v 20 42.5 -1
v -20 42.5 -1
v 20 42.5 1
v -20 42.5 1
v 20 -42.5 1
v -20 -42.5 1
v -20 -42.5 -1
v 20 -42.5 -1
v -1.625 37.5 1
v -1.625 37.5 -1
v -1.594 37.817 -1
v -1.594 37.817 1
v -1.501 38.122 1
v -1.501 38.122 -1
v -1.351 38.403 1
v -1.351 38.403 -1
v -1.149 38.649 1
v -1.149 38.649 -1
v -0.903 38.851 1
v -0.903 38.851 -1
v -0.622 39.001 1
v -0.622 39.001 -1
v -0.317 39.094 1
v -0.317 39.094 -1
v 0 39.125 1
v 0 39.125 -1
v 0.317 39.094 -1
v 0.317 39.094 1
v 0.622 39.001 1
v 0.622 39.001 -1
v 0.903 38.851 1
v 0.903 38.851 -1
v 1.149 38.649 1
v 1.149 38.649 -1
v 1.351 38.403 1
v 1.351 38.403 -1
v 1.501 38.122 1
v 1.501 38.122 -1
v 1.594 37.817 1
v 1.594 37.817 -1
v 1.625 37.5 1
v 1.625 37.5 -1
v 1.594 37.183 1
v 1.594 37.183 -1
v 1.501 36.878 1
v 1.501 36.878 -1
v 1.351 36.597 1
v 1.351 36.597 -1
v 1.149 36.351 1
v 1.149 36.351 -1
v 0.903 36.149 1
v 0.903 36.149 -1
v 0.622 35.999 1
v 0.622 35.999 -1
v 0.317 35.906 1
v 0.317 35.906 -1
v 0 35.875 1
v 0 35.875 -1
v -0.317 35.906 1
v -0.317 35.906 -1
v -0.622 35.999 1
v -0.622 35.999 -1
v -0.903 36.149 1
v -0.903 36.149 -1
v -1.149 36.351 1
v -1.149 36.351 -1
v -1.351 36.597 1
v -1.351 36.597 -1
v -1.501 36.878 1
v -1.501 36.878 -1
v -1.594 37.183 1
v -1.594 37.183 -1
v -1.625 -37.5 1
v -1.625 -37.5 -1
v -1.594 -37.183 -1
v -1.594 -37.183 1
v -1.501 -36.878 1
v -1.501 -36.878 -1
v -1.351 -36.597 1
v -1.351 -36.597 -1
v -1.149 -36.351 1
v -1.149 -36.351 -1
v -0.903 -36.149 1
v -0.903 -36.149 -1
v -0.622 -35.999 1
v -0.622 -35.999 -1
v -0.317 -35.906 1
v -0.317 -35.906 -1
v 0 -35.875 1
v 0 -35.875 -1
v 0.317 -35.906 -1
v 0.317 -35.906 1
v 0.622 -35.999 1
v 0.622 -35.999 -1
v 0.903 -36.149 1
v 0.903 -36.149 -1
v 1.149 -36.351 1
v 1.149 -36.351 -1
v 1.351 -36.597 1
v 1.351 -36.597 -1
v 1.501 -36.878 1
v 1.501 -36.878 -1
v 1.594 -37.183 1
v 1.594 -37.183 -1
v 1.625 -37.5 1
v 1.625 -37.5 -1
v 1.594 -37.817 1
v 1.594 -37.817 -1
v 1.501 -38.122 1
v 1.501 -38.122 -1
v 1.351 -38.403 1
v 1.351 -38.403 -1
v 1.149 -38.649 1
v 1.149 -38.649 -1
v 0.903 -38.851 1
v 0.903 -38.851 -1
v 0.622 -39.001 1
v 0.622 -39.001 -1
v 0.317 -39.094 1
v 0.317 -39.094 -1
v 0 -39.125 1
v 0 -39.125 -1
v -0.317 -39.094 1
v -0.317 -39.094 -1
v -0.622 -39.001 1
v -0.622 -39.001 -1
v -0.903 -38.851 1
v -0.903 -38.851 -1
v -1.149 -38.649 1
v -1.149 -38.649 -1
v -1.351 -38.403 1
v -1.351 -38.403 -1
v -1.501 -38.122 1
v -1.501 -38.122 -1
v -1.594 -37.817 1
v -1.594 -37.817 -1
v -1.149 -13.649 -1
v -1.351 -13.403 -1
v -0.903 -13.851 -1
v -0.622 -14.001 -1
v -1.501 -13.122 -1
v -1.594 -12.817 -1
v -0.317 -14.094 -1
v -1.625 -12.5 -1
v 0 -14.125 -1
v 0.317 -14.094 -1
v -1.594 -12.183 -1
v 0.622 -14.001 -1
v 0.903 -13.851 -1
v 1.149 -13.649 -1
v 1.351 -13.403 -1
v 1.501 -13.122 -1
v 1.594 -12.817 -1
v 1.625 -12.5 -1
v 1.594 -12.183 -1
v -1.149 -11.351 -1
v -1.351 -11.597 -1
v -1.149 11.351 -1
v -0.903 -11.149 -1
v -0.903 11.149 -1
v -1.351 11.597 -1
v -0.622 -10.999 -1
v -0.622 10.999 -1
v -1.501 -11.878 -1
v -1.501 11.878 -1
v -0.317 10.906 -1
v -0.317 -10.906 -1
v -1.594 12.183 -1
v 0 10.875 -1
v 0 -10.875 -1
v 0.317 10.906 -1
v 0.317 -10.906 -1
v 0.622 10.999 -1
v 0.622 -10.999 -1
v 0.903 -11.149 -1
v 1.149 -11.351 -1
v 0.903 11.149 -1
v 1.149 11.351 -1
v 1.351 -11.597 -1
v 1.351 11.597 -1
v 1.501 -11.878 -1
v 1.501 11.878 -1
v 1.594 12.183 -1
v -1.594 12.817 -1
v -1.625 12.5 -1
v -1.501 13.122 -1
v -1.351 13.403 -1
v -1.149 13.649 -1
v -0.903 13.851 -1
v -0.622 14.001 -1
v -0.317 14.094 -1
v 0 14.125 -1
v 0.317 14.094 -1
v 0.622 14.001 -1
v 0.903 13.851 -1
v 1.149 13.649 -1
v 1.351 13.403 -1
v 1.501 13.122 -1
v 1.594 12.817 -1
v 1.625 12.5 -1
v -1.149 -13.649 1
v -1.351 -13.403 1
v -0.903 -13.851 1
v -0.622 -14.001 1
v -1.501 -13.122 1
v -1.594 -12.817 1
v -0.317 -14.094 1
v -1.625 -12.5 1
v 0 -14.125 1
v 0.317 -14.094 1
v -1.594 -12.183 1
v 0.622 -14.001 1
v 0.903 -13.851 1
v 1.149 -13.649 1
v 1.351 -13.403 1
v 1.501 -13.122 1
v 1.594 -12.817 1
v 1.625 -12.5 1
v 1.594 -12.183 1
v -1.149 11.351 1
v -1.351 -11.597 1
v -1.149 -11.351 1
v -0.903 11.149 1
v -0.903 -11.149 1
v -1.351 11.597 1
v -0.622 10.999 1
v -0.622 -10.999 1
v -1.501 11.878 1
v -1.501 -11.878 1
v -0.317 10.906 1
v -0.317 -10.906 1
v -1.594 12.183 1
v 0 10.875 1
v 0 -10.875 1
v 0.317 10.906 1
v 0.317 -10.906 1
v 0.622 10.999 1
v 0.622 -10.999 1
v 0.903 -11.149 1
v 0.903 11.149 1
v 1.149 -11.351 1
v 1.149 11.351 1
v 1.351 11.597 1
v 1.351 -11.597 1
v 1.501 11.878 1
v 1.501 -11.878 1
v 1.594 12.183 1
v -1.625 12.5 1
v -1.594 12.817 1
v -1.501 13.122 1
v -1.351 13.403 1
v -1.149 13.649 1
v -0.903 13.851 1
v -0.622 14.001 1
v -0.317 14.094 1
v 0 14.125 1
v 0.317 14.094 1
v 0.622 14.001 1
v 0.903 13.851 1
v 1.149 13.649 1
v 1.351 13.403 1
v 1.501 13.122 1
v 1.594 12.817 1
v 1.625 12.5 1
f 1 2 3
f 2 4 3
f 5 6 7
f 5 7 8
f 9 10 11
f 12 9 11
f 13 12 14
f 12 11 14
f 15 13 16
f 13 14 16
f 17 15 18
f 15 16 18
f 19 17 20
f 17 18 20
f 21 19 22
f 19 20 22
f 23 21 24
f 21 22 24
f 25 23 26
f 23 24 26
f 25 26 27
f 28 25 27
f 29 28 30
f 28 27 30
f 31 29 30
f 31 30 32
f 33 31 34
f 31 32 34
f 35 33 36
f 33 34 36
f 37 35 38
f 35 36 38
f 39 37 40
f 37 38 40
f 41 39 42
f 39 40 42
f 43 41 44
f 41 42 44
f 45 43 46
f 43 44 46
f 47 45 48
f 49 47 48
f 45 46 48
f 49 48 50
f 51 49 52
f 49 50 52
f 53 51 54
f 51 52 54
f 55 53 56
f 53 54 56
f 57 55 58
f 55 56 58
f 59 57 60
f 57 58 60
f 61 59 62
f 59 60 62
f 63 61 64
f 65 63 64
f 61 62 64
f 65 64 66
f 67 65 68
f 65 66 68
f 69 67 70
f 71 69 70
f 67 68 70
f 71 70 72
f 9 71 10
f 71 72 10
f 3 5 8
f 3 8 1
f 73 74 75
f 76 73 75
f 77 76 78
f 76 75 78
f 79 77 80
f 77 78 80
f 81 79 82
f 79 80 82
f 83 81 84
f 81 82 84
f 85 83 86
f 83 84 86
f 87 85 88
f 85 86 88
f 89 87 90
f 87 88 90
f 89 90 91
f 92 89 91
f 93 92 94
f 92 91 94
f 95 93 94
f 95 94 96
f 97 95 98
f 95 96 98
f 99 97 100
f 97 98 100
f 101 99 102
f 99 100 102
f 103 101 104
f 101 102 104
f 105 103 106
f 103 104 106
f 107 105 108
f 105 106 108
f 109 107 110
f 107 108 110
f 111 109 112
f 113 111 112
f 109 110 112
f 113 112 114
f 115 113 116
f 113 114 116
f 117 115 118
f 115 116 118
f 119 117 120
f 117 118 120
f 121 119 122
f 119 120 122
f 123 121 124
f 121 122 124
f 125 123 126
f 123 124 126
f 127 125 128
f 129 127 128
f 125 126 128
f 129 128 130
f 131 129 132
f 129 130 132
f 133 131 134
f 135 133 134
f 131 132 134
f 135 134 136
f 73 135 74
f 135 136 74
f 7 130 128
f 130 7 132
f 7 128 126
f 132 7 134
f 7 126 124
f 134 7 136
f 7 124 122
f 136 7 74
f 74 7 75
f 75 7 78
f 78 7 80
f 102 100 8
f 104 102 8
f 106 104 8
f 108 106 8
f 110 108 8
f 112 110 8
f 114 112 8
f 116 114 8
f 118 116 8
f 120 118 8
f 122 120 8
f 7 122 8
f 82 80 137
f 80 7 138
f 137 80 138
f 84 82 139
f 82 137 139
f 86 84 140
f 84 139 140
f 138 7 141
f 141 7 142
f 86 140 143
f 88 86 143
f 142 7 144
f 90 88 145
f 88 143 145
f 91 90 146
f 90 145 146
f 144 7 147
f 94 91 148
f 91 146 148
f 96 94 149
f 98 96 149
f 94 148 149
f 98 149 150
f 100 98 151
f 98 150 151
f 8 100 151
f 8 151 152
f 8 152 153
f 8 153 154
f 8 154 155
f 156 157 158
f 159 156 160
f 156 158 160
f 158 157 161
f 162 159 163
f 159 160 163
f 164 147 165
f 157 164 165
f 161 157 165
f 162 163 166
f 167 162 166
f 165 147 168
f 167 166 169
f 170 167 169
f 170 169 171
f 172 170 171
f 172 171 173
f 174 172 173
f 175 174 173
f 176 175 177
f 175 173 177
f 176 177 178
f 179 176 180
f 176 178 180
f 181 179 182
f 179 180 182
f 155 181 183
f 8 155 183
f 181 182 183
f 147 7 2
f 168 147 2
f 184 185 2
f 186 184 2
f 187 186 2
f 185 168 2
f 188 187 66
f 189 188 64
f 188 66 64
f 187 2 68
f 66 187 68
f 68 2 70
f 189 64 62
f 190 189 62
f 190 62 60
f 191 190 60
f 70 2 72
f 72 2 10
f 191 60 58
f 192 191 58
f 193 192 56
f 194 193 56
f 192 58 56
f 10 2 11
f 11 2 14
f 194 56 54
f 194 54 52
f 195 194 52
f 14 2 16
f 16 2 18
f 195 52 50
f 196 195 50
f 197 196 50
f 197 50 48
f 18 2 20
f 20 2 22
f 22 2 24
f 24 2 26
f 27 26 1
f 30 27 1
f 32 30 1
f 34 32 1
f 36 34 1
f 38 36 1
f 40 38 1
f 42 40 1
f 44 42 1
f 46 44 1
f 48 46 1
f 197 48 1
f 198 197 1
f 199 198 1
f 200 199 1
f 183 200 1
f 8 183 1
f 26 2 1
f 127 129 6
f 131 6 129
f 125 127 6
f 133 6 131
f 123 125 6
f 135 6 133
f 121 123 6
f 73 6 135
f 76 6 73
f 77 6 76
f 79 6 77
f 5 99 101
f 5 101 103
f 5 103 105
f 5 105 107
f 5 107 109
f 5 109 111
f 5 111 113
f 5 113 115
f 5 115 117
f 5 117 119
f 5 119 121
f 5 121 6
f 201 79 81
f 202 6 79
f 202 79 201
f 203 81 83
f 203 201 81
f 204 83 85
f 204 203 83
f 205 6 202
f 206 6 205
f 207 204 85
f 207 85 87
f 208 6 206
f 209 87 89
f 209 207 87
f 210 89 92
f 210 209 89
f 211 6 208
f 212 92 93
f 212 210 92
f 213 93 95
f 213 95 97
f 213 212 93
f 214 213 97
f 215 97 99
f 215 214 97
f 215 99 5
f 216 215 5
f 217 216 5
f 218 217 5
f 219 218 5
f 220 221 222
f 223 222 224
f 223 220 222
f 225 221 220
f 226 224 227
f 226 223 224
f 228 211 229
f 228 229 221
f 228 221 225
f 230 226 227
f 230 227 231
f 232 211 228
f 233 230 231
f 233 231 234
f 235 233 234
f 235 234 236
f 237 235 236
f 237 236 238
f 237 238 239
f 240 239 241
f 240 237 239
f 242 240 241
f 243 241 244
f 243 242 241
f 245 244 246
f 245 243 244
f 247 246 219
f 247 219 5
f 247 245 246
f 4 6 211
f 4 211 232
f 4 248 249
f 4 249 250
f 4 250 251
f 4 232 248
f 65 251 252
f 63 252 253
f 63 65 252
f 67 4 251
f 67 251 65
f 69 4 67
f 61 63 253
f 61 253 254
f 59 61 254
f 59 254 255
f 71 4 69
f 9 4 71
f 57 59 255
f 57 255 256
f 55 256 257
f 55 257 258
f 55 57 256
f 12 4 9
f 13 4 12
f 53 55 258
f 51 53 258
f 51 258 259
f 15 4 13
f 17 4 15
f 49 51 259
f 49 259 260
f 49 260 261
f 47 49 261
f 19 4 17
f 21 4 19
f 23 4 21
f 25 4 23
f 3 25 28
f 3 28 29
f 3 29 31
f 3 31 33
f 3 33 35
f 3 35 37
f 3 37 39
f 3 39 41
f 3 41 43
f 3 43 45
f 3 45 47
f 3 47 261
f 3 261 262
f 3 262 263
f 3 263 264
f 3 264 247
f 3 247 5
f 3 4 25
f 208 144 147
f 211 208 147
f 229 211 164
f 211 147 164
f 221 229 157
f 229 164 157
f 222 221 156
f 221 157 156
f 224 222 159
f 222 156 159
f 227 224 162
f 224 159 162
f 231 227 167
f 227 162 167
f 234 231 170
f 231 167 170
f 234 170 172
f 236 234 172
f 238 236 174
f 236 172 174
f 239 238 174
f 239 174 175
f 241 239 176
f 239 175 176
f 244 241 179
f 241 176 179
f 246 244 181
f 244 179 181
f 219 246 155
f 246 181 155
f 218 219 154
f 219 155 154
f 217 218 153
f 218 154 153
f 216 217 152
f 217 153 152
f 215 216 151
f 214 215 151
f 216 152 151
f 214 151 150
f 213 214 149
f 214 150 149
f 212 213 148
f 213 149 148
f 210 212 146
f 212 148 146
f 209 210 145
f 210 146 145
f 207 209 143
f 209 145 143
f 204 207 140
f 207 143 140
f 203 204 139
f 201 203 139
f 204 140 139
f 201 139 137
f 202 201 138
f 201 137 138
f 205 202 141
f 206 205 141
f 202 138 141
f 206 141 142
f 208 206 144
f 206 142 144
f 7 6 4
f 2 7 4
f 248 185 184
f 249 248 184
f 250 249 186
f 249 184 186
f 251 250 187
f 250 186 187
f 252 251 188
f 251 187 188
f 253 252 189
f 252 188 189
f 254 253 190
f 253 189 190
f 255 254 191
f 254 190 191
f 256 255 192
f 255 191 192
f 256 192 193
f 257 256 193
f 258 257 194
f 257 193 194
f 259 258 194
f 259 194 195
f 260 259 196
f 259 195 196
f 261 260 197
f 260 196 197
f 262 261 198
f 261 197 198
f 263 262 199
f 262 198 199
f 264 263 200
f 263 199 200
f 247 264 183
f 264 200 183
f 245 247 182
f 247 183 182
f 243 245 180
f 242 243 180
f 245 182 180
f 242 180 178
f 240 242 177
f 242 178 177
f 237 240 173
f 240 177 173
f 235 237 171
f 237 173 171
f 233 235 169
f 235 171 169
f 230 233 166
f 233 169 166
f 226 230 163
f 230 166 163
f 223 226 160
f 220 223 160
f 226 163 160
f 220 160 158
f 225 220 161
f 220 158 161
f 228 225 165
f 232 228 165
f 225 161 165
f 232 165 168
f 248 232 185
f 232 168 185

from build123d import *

# Parameters (mm, degrees)
SCHIZZO1_W                   = 40
SCHIZZO1_H                   = 85
ESTRUSIONE_ESTRUSIONE1_DEPTH = 1
SCHIZZO2_R                   = 1.625
TAGLIO_ESTRUSIONE1_DEPTH     = 2
RIPETIZIONE_A_L1_COUNT       = 4
RIPETIZIONE_A_L1_PITCH       = 25


with BuildPart() as part:
    # Schizzo1 → Estrusione-Estrusione1 (new body, symmetric)
    with BuildSketch(Plane.XY):
        Rectangle(SCHIZZO1_W, SCHIZZO1_H)
    extrude(amount=ESTRUSIONE_ESTRUSIONE1_DEPTH, both=True)

    # Schizzo2 → Taglio-Estrusione1 (cut)
    with BuildSketch(Plane(origin=(0, 0, -1), x_dir=(-1, 0, 0), z_dir=(0, 0, -1))):
        with Locations((0, 37.5)):
            Circle(SCHIZZO2_R)
    taglio_estrusione1 = extrude(amount=-TAGLIO_ESTRUSIONE1_DEPTH, mode=Mode.SUBTRACT)

    # Ripetizione a L1: Taglio-Estrusione1 ×4
    with Locations(*[(0, -i * RIPETIZIONE_A_L1_PITCH, 0) for i in range(1, RIPETIZIONE_A_L1_COUNT)]):
        add(taglio_estrusione1, mode=Mode.SUBTRACT)


solid = part.part
